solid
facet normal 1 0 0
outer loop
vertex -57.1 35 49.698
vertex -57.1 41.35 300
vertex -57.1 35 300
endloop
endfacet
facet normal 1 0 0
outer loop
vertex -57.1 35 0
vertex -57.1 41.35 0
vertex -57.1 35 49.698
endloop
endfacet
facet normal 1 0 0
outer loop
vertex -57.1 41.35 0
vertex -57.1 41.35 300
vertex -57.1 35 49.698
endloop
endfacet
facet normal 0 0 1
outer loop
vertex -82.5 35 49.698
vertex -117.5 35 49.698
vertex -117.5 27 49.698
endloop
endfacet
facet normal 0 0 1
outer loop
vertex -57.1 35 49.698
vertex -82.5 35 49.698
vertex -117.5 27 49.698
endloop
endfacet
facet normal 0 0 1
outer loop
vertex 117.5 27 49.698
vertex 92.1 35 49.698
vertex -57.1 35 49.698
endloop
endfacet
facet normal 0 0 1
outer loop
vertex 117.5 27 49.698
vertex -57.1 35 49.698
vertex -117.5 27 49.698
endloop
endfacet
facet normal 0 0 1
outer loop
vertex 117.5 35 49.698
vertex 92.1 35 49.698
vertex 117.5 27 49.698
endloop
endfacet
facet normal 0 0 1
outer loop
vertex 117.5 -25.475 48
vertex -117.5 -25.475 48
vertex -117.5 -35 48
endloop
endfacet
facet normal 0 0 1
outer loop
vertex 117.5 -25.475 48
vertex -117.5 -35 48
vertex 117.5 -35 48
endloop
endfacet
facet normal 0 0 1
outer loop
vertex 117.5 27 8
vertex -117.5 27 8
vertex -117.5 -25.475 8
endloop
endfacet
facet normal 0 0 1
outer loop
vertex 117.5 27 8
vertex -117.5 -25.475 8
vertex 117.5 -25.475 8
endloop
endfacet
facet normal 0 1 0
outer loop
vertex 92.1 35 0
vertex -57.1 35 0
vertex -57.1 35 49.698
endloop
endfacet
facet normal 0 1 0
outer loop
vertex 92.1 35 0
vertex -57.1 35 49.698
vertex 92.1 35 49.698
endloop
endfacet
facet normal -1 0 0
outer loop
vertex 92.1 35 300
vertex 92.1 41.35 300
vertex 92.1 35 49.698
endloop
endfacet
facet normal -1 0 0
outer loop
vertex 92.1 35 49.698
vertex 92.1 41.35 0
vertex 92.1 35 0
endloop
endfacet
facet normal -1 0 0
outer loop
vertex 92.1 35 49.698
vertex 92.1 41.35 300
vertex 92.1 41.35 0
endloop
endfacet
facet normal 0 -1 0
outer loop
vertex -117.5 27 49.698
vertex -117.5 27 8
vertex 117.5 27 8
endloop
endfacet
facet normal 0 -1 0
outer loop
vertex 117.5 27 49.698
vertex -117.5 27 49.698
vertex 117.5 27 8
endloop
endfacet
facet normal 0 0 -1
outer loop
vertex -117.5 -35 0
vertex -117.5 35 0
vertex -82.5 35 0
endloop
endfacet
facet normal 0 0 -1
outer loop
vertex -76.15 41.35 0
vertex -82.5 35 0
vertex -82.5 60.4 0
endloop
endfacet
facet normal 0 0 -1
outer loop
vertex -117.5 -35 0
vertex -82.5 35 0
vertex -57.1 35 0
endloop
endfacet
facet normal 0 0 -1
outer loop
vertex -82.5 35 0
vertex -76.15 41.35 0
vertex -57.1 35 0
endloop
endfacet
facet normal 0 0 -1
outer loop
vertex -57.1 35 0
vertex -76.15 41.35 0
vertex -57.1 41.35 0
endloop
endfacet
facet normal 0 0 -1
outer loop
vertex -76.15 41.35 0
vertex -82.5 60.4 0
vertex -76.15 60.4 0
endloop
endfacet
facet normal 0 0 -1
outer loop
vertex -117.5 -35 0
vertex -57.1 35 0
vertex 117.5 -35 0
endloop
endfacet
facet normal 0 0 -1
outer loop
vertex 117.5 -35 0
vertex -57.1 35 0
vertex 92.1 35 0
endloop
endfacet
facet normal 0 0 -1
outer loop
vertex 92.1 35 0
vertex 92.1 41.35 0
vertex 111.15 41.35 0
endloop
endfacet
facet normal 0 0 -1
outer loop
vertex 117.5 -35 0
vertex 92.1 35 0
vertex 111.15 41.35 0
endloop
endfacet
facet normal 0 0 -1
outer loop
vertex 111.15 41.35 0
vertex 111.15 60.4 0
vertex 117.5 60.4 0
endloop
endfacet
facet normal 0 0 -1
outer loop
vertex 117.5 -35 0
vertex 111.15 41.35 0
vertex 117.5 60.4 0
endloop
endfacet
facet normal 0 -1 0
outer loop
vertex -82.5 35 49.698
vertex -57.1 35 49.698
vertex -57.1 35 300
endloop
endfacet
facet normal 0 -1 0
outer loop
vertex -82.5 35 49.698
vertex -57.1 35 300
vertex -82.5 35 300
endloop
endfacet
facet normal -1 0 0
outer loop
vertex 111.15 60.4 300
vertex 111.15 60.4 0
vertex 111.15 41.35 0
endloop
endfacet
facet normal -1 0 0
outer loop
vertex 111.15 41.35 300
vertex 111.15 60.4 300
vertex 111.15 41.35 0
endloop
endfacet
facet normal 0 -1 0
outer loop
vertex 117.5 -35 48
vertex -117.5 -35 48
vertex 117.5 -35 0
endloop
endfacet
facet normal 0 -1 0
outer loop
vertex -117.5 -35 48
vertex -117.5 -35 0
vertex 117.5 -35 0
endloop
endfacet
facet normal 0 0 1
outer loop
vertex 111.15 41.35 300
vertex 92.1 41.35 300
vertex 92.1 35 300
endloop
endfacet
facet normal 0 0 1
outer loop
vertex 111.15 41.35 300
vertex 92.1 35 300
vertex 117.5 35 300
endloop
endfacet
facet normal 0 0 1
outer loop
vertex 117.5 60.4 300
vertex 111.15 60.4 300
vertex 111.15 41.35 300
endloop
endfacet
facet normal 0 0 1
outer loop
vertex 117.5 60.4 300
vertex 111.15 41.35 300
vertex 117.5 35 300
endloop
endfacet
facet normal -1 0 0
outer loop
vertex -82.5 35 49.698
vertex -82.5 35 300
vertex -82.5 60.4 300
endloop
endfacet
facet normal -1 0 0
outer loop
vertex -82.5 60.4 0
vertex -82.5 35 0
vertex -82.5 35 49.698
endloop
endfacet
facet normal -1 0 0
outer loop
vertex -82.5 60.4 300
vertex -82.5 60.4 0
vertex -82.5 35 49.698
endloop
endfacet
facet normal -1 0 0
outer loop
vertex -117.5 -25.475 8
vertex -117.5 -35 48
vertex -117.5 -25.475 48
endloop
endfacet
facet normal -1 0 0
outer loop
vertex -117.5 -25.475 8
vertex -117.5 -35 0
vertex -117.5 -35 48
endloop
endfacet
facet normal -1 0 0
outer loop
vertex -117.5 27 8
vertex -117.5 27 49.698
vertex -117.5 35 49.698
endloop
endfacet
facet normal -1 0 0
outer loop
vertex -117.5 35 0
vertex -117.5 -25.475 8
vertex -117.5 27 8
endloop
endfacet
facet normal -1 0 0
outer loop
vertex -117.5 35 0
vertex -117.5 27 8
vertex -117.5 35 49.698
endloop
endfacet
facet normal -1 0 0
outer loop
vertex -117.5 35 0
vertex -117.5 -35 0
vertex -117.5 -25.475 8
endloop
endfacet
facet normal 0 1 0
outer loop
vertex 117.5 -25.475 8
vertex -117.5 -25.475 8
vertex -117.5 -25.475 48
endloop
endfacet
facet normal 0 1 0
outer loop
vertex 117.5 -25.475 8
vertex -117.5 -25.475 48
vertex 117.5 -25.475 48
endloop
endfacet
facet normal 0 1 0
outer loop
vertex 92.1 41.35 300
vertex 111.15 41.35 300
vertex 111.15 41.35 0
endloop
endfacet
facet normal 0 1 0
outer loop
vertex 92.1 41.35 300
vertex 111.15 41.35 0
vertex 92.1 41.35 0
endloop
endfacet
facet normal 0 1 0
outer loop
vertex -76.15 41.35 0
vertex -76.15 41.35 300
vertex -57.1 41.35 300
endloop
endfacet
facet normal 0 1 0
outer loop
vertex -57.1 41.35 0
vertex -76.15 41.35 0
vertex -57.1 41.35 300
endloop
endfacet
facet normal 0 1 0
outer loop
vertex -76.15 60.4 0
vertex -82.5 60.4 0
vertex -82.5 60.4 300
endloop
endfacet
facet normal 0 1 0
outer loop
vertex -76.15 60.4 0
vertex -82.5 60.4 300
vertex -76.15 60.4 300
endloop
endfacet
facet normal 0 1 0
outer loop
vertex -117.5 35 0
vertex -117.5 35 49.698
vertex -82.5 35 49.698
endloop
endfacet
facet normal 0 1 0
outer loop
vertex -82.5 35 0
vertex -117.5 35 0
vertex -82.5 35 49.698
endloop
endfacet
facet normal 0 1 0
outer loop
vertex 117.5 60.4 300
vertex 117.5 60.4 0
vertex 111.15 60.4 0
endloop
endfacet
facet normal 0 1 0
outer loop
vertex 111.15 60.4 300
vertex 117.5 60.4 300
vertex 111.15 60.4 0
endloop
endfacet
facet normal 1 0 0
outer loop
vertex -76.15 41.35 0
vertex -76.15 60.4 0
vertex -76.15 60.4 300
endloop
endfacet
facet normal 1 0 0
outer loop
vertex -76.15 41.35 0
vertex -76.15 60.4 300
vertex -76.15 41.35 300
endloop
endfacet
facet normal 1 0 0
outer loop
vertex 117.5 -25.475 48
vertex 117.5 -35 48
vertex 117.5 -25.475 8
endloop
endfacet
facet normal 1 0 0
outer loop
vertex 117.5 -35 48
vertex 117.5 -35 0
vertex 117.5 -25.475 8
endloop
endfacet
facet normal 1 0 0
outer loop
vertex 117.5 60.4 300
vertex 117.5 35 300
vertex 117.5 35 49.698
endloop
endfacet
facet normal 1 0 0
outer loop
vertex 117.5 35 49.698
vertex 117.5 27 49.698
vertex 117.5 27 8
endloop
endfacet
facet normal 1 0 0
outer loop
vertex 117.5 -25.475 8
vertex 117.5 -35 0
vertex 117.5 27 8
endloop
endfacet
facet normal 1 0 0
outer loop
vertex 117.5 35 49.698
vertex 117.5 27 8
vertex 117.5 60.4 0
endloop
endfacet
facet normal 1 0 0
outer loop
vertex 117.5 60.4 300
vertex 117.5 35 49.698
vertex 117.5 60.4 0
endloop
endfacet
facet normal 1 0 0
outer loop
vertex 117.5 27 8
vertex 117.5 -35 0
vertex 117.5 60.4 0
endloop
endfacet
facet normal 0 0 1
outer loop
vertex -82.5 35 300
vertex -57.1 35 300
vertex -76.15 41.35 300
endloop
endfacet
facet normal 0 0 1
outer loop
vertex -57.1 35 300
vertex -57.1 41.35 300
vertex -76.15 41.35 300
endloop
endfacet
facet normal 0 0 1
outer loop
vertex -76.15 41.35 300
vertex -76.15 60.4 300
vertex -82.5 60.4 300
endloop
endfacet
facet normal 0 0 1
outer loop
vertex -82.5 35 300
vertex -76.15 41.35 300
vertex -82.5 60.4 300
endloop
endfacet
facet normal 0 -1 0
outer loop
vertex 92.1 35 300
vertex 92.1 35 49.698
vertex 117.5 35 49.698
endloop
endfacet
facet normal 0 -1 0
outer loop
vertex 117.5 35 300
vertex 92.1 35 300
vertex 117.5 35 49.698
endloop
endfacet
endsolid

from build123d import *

# Parameters (mm, degrees)
CROQUIS1_W              = 235
CROQUIS1_H              = 70
SALIENTE_EXTRUIR1_DEPTH = 8
CROQUIS2_W              = 235
CROQUIS2_H              = 49.698460378
SALIENTE_EXTRUIR2_DEPTH = 8
SALIENTE_EXTRUIR3_DEPTH = 300
CROQUIS4_W              = 235
CROQUIS4_H              = 9.525
SALIENTE_EXTRUIR4_DEPTH = 40


with BuildPart() as part:
    # Croquis1 → Saliente-Extruir1 (new body)
    with BuildSketch(Plane.XY):
        Rectangle(CROQUIS1_W, CROQUIS1_H)
    extrude(amount=SALIENTE_EXTRUIR1_DEPTH)

    # Croquis2 → Saliente-Extruir2 (add)
    with BuildSketch(Plane(origin=(0, 35, 0), x_dir=(1, 0, 0), z_dir=(0, 1, 0))):
        with Locations((0, -24.849230189)):
            Rectangle(CROQUIS2_W, CROQUIS2_H)
    extrude(amount=-SALIENTE_EXTRUIR2_DEPTH)

    # Croquis3 → Saliente-Extruir3 (add)
    with BuildSketch(Plane(origin=(0, 0, 0), x_dir=(-1, 0, 0), z_dir=(0, 0, -1))):
        Polygon((-117.5, 35), (-117.5, 60.4), (-111.15, 60.4), (-111.15, 41.35), (-92.1, 41.35), (-92.1, 35), align=None)
        Polygon((57.1, 35), (82.5, 35), (82.5, 60.4), (76.15, 60.4), (76.15, 41.35), (57.1, 41.35), align=None)
    extrude(amount=-SALIENTE_EXTRUIR3_DEPTH)

    # Croquis4 → Saliente-Extruir4 (add)
    with BuildSketch(Plane.XY.offset(8)):
        with Locations((0, -30.2375)):
            Rectangle(CROQUIS4_W, CROQUIS4_H)
    extrude(amount=SALIENTE_EXTRUIR4_DEPTH)


solid = part.part
